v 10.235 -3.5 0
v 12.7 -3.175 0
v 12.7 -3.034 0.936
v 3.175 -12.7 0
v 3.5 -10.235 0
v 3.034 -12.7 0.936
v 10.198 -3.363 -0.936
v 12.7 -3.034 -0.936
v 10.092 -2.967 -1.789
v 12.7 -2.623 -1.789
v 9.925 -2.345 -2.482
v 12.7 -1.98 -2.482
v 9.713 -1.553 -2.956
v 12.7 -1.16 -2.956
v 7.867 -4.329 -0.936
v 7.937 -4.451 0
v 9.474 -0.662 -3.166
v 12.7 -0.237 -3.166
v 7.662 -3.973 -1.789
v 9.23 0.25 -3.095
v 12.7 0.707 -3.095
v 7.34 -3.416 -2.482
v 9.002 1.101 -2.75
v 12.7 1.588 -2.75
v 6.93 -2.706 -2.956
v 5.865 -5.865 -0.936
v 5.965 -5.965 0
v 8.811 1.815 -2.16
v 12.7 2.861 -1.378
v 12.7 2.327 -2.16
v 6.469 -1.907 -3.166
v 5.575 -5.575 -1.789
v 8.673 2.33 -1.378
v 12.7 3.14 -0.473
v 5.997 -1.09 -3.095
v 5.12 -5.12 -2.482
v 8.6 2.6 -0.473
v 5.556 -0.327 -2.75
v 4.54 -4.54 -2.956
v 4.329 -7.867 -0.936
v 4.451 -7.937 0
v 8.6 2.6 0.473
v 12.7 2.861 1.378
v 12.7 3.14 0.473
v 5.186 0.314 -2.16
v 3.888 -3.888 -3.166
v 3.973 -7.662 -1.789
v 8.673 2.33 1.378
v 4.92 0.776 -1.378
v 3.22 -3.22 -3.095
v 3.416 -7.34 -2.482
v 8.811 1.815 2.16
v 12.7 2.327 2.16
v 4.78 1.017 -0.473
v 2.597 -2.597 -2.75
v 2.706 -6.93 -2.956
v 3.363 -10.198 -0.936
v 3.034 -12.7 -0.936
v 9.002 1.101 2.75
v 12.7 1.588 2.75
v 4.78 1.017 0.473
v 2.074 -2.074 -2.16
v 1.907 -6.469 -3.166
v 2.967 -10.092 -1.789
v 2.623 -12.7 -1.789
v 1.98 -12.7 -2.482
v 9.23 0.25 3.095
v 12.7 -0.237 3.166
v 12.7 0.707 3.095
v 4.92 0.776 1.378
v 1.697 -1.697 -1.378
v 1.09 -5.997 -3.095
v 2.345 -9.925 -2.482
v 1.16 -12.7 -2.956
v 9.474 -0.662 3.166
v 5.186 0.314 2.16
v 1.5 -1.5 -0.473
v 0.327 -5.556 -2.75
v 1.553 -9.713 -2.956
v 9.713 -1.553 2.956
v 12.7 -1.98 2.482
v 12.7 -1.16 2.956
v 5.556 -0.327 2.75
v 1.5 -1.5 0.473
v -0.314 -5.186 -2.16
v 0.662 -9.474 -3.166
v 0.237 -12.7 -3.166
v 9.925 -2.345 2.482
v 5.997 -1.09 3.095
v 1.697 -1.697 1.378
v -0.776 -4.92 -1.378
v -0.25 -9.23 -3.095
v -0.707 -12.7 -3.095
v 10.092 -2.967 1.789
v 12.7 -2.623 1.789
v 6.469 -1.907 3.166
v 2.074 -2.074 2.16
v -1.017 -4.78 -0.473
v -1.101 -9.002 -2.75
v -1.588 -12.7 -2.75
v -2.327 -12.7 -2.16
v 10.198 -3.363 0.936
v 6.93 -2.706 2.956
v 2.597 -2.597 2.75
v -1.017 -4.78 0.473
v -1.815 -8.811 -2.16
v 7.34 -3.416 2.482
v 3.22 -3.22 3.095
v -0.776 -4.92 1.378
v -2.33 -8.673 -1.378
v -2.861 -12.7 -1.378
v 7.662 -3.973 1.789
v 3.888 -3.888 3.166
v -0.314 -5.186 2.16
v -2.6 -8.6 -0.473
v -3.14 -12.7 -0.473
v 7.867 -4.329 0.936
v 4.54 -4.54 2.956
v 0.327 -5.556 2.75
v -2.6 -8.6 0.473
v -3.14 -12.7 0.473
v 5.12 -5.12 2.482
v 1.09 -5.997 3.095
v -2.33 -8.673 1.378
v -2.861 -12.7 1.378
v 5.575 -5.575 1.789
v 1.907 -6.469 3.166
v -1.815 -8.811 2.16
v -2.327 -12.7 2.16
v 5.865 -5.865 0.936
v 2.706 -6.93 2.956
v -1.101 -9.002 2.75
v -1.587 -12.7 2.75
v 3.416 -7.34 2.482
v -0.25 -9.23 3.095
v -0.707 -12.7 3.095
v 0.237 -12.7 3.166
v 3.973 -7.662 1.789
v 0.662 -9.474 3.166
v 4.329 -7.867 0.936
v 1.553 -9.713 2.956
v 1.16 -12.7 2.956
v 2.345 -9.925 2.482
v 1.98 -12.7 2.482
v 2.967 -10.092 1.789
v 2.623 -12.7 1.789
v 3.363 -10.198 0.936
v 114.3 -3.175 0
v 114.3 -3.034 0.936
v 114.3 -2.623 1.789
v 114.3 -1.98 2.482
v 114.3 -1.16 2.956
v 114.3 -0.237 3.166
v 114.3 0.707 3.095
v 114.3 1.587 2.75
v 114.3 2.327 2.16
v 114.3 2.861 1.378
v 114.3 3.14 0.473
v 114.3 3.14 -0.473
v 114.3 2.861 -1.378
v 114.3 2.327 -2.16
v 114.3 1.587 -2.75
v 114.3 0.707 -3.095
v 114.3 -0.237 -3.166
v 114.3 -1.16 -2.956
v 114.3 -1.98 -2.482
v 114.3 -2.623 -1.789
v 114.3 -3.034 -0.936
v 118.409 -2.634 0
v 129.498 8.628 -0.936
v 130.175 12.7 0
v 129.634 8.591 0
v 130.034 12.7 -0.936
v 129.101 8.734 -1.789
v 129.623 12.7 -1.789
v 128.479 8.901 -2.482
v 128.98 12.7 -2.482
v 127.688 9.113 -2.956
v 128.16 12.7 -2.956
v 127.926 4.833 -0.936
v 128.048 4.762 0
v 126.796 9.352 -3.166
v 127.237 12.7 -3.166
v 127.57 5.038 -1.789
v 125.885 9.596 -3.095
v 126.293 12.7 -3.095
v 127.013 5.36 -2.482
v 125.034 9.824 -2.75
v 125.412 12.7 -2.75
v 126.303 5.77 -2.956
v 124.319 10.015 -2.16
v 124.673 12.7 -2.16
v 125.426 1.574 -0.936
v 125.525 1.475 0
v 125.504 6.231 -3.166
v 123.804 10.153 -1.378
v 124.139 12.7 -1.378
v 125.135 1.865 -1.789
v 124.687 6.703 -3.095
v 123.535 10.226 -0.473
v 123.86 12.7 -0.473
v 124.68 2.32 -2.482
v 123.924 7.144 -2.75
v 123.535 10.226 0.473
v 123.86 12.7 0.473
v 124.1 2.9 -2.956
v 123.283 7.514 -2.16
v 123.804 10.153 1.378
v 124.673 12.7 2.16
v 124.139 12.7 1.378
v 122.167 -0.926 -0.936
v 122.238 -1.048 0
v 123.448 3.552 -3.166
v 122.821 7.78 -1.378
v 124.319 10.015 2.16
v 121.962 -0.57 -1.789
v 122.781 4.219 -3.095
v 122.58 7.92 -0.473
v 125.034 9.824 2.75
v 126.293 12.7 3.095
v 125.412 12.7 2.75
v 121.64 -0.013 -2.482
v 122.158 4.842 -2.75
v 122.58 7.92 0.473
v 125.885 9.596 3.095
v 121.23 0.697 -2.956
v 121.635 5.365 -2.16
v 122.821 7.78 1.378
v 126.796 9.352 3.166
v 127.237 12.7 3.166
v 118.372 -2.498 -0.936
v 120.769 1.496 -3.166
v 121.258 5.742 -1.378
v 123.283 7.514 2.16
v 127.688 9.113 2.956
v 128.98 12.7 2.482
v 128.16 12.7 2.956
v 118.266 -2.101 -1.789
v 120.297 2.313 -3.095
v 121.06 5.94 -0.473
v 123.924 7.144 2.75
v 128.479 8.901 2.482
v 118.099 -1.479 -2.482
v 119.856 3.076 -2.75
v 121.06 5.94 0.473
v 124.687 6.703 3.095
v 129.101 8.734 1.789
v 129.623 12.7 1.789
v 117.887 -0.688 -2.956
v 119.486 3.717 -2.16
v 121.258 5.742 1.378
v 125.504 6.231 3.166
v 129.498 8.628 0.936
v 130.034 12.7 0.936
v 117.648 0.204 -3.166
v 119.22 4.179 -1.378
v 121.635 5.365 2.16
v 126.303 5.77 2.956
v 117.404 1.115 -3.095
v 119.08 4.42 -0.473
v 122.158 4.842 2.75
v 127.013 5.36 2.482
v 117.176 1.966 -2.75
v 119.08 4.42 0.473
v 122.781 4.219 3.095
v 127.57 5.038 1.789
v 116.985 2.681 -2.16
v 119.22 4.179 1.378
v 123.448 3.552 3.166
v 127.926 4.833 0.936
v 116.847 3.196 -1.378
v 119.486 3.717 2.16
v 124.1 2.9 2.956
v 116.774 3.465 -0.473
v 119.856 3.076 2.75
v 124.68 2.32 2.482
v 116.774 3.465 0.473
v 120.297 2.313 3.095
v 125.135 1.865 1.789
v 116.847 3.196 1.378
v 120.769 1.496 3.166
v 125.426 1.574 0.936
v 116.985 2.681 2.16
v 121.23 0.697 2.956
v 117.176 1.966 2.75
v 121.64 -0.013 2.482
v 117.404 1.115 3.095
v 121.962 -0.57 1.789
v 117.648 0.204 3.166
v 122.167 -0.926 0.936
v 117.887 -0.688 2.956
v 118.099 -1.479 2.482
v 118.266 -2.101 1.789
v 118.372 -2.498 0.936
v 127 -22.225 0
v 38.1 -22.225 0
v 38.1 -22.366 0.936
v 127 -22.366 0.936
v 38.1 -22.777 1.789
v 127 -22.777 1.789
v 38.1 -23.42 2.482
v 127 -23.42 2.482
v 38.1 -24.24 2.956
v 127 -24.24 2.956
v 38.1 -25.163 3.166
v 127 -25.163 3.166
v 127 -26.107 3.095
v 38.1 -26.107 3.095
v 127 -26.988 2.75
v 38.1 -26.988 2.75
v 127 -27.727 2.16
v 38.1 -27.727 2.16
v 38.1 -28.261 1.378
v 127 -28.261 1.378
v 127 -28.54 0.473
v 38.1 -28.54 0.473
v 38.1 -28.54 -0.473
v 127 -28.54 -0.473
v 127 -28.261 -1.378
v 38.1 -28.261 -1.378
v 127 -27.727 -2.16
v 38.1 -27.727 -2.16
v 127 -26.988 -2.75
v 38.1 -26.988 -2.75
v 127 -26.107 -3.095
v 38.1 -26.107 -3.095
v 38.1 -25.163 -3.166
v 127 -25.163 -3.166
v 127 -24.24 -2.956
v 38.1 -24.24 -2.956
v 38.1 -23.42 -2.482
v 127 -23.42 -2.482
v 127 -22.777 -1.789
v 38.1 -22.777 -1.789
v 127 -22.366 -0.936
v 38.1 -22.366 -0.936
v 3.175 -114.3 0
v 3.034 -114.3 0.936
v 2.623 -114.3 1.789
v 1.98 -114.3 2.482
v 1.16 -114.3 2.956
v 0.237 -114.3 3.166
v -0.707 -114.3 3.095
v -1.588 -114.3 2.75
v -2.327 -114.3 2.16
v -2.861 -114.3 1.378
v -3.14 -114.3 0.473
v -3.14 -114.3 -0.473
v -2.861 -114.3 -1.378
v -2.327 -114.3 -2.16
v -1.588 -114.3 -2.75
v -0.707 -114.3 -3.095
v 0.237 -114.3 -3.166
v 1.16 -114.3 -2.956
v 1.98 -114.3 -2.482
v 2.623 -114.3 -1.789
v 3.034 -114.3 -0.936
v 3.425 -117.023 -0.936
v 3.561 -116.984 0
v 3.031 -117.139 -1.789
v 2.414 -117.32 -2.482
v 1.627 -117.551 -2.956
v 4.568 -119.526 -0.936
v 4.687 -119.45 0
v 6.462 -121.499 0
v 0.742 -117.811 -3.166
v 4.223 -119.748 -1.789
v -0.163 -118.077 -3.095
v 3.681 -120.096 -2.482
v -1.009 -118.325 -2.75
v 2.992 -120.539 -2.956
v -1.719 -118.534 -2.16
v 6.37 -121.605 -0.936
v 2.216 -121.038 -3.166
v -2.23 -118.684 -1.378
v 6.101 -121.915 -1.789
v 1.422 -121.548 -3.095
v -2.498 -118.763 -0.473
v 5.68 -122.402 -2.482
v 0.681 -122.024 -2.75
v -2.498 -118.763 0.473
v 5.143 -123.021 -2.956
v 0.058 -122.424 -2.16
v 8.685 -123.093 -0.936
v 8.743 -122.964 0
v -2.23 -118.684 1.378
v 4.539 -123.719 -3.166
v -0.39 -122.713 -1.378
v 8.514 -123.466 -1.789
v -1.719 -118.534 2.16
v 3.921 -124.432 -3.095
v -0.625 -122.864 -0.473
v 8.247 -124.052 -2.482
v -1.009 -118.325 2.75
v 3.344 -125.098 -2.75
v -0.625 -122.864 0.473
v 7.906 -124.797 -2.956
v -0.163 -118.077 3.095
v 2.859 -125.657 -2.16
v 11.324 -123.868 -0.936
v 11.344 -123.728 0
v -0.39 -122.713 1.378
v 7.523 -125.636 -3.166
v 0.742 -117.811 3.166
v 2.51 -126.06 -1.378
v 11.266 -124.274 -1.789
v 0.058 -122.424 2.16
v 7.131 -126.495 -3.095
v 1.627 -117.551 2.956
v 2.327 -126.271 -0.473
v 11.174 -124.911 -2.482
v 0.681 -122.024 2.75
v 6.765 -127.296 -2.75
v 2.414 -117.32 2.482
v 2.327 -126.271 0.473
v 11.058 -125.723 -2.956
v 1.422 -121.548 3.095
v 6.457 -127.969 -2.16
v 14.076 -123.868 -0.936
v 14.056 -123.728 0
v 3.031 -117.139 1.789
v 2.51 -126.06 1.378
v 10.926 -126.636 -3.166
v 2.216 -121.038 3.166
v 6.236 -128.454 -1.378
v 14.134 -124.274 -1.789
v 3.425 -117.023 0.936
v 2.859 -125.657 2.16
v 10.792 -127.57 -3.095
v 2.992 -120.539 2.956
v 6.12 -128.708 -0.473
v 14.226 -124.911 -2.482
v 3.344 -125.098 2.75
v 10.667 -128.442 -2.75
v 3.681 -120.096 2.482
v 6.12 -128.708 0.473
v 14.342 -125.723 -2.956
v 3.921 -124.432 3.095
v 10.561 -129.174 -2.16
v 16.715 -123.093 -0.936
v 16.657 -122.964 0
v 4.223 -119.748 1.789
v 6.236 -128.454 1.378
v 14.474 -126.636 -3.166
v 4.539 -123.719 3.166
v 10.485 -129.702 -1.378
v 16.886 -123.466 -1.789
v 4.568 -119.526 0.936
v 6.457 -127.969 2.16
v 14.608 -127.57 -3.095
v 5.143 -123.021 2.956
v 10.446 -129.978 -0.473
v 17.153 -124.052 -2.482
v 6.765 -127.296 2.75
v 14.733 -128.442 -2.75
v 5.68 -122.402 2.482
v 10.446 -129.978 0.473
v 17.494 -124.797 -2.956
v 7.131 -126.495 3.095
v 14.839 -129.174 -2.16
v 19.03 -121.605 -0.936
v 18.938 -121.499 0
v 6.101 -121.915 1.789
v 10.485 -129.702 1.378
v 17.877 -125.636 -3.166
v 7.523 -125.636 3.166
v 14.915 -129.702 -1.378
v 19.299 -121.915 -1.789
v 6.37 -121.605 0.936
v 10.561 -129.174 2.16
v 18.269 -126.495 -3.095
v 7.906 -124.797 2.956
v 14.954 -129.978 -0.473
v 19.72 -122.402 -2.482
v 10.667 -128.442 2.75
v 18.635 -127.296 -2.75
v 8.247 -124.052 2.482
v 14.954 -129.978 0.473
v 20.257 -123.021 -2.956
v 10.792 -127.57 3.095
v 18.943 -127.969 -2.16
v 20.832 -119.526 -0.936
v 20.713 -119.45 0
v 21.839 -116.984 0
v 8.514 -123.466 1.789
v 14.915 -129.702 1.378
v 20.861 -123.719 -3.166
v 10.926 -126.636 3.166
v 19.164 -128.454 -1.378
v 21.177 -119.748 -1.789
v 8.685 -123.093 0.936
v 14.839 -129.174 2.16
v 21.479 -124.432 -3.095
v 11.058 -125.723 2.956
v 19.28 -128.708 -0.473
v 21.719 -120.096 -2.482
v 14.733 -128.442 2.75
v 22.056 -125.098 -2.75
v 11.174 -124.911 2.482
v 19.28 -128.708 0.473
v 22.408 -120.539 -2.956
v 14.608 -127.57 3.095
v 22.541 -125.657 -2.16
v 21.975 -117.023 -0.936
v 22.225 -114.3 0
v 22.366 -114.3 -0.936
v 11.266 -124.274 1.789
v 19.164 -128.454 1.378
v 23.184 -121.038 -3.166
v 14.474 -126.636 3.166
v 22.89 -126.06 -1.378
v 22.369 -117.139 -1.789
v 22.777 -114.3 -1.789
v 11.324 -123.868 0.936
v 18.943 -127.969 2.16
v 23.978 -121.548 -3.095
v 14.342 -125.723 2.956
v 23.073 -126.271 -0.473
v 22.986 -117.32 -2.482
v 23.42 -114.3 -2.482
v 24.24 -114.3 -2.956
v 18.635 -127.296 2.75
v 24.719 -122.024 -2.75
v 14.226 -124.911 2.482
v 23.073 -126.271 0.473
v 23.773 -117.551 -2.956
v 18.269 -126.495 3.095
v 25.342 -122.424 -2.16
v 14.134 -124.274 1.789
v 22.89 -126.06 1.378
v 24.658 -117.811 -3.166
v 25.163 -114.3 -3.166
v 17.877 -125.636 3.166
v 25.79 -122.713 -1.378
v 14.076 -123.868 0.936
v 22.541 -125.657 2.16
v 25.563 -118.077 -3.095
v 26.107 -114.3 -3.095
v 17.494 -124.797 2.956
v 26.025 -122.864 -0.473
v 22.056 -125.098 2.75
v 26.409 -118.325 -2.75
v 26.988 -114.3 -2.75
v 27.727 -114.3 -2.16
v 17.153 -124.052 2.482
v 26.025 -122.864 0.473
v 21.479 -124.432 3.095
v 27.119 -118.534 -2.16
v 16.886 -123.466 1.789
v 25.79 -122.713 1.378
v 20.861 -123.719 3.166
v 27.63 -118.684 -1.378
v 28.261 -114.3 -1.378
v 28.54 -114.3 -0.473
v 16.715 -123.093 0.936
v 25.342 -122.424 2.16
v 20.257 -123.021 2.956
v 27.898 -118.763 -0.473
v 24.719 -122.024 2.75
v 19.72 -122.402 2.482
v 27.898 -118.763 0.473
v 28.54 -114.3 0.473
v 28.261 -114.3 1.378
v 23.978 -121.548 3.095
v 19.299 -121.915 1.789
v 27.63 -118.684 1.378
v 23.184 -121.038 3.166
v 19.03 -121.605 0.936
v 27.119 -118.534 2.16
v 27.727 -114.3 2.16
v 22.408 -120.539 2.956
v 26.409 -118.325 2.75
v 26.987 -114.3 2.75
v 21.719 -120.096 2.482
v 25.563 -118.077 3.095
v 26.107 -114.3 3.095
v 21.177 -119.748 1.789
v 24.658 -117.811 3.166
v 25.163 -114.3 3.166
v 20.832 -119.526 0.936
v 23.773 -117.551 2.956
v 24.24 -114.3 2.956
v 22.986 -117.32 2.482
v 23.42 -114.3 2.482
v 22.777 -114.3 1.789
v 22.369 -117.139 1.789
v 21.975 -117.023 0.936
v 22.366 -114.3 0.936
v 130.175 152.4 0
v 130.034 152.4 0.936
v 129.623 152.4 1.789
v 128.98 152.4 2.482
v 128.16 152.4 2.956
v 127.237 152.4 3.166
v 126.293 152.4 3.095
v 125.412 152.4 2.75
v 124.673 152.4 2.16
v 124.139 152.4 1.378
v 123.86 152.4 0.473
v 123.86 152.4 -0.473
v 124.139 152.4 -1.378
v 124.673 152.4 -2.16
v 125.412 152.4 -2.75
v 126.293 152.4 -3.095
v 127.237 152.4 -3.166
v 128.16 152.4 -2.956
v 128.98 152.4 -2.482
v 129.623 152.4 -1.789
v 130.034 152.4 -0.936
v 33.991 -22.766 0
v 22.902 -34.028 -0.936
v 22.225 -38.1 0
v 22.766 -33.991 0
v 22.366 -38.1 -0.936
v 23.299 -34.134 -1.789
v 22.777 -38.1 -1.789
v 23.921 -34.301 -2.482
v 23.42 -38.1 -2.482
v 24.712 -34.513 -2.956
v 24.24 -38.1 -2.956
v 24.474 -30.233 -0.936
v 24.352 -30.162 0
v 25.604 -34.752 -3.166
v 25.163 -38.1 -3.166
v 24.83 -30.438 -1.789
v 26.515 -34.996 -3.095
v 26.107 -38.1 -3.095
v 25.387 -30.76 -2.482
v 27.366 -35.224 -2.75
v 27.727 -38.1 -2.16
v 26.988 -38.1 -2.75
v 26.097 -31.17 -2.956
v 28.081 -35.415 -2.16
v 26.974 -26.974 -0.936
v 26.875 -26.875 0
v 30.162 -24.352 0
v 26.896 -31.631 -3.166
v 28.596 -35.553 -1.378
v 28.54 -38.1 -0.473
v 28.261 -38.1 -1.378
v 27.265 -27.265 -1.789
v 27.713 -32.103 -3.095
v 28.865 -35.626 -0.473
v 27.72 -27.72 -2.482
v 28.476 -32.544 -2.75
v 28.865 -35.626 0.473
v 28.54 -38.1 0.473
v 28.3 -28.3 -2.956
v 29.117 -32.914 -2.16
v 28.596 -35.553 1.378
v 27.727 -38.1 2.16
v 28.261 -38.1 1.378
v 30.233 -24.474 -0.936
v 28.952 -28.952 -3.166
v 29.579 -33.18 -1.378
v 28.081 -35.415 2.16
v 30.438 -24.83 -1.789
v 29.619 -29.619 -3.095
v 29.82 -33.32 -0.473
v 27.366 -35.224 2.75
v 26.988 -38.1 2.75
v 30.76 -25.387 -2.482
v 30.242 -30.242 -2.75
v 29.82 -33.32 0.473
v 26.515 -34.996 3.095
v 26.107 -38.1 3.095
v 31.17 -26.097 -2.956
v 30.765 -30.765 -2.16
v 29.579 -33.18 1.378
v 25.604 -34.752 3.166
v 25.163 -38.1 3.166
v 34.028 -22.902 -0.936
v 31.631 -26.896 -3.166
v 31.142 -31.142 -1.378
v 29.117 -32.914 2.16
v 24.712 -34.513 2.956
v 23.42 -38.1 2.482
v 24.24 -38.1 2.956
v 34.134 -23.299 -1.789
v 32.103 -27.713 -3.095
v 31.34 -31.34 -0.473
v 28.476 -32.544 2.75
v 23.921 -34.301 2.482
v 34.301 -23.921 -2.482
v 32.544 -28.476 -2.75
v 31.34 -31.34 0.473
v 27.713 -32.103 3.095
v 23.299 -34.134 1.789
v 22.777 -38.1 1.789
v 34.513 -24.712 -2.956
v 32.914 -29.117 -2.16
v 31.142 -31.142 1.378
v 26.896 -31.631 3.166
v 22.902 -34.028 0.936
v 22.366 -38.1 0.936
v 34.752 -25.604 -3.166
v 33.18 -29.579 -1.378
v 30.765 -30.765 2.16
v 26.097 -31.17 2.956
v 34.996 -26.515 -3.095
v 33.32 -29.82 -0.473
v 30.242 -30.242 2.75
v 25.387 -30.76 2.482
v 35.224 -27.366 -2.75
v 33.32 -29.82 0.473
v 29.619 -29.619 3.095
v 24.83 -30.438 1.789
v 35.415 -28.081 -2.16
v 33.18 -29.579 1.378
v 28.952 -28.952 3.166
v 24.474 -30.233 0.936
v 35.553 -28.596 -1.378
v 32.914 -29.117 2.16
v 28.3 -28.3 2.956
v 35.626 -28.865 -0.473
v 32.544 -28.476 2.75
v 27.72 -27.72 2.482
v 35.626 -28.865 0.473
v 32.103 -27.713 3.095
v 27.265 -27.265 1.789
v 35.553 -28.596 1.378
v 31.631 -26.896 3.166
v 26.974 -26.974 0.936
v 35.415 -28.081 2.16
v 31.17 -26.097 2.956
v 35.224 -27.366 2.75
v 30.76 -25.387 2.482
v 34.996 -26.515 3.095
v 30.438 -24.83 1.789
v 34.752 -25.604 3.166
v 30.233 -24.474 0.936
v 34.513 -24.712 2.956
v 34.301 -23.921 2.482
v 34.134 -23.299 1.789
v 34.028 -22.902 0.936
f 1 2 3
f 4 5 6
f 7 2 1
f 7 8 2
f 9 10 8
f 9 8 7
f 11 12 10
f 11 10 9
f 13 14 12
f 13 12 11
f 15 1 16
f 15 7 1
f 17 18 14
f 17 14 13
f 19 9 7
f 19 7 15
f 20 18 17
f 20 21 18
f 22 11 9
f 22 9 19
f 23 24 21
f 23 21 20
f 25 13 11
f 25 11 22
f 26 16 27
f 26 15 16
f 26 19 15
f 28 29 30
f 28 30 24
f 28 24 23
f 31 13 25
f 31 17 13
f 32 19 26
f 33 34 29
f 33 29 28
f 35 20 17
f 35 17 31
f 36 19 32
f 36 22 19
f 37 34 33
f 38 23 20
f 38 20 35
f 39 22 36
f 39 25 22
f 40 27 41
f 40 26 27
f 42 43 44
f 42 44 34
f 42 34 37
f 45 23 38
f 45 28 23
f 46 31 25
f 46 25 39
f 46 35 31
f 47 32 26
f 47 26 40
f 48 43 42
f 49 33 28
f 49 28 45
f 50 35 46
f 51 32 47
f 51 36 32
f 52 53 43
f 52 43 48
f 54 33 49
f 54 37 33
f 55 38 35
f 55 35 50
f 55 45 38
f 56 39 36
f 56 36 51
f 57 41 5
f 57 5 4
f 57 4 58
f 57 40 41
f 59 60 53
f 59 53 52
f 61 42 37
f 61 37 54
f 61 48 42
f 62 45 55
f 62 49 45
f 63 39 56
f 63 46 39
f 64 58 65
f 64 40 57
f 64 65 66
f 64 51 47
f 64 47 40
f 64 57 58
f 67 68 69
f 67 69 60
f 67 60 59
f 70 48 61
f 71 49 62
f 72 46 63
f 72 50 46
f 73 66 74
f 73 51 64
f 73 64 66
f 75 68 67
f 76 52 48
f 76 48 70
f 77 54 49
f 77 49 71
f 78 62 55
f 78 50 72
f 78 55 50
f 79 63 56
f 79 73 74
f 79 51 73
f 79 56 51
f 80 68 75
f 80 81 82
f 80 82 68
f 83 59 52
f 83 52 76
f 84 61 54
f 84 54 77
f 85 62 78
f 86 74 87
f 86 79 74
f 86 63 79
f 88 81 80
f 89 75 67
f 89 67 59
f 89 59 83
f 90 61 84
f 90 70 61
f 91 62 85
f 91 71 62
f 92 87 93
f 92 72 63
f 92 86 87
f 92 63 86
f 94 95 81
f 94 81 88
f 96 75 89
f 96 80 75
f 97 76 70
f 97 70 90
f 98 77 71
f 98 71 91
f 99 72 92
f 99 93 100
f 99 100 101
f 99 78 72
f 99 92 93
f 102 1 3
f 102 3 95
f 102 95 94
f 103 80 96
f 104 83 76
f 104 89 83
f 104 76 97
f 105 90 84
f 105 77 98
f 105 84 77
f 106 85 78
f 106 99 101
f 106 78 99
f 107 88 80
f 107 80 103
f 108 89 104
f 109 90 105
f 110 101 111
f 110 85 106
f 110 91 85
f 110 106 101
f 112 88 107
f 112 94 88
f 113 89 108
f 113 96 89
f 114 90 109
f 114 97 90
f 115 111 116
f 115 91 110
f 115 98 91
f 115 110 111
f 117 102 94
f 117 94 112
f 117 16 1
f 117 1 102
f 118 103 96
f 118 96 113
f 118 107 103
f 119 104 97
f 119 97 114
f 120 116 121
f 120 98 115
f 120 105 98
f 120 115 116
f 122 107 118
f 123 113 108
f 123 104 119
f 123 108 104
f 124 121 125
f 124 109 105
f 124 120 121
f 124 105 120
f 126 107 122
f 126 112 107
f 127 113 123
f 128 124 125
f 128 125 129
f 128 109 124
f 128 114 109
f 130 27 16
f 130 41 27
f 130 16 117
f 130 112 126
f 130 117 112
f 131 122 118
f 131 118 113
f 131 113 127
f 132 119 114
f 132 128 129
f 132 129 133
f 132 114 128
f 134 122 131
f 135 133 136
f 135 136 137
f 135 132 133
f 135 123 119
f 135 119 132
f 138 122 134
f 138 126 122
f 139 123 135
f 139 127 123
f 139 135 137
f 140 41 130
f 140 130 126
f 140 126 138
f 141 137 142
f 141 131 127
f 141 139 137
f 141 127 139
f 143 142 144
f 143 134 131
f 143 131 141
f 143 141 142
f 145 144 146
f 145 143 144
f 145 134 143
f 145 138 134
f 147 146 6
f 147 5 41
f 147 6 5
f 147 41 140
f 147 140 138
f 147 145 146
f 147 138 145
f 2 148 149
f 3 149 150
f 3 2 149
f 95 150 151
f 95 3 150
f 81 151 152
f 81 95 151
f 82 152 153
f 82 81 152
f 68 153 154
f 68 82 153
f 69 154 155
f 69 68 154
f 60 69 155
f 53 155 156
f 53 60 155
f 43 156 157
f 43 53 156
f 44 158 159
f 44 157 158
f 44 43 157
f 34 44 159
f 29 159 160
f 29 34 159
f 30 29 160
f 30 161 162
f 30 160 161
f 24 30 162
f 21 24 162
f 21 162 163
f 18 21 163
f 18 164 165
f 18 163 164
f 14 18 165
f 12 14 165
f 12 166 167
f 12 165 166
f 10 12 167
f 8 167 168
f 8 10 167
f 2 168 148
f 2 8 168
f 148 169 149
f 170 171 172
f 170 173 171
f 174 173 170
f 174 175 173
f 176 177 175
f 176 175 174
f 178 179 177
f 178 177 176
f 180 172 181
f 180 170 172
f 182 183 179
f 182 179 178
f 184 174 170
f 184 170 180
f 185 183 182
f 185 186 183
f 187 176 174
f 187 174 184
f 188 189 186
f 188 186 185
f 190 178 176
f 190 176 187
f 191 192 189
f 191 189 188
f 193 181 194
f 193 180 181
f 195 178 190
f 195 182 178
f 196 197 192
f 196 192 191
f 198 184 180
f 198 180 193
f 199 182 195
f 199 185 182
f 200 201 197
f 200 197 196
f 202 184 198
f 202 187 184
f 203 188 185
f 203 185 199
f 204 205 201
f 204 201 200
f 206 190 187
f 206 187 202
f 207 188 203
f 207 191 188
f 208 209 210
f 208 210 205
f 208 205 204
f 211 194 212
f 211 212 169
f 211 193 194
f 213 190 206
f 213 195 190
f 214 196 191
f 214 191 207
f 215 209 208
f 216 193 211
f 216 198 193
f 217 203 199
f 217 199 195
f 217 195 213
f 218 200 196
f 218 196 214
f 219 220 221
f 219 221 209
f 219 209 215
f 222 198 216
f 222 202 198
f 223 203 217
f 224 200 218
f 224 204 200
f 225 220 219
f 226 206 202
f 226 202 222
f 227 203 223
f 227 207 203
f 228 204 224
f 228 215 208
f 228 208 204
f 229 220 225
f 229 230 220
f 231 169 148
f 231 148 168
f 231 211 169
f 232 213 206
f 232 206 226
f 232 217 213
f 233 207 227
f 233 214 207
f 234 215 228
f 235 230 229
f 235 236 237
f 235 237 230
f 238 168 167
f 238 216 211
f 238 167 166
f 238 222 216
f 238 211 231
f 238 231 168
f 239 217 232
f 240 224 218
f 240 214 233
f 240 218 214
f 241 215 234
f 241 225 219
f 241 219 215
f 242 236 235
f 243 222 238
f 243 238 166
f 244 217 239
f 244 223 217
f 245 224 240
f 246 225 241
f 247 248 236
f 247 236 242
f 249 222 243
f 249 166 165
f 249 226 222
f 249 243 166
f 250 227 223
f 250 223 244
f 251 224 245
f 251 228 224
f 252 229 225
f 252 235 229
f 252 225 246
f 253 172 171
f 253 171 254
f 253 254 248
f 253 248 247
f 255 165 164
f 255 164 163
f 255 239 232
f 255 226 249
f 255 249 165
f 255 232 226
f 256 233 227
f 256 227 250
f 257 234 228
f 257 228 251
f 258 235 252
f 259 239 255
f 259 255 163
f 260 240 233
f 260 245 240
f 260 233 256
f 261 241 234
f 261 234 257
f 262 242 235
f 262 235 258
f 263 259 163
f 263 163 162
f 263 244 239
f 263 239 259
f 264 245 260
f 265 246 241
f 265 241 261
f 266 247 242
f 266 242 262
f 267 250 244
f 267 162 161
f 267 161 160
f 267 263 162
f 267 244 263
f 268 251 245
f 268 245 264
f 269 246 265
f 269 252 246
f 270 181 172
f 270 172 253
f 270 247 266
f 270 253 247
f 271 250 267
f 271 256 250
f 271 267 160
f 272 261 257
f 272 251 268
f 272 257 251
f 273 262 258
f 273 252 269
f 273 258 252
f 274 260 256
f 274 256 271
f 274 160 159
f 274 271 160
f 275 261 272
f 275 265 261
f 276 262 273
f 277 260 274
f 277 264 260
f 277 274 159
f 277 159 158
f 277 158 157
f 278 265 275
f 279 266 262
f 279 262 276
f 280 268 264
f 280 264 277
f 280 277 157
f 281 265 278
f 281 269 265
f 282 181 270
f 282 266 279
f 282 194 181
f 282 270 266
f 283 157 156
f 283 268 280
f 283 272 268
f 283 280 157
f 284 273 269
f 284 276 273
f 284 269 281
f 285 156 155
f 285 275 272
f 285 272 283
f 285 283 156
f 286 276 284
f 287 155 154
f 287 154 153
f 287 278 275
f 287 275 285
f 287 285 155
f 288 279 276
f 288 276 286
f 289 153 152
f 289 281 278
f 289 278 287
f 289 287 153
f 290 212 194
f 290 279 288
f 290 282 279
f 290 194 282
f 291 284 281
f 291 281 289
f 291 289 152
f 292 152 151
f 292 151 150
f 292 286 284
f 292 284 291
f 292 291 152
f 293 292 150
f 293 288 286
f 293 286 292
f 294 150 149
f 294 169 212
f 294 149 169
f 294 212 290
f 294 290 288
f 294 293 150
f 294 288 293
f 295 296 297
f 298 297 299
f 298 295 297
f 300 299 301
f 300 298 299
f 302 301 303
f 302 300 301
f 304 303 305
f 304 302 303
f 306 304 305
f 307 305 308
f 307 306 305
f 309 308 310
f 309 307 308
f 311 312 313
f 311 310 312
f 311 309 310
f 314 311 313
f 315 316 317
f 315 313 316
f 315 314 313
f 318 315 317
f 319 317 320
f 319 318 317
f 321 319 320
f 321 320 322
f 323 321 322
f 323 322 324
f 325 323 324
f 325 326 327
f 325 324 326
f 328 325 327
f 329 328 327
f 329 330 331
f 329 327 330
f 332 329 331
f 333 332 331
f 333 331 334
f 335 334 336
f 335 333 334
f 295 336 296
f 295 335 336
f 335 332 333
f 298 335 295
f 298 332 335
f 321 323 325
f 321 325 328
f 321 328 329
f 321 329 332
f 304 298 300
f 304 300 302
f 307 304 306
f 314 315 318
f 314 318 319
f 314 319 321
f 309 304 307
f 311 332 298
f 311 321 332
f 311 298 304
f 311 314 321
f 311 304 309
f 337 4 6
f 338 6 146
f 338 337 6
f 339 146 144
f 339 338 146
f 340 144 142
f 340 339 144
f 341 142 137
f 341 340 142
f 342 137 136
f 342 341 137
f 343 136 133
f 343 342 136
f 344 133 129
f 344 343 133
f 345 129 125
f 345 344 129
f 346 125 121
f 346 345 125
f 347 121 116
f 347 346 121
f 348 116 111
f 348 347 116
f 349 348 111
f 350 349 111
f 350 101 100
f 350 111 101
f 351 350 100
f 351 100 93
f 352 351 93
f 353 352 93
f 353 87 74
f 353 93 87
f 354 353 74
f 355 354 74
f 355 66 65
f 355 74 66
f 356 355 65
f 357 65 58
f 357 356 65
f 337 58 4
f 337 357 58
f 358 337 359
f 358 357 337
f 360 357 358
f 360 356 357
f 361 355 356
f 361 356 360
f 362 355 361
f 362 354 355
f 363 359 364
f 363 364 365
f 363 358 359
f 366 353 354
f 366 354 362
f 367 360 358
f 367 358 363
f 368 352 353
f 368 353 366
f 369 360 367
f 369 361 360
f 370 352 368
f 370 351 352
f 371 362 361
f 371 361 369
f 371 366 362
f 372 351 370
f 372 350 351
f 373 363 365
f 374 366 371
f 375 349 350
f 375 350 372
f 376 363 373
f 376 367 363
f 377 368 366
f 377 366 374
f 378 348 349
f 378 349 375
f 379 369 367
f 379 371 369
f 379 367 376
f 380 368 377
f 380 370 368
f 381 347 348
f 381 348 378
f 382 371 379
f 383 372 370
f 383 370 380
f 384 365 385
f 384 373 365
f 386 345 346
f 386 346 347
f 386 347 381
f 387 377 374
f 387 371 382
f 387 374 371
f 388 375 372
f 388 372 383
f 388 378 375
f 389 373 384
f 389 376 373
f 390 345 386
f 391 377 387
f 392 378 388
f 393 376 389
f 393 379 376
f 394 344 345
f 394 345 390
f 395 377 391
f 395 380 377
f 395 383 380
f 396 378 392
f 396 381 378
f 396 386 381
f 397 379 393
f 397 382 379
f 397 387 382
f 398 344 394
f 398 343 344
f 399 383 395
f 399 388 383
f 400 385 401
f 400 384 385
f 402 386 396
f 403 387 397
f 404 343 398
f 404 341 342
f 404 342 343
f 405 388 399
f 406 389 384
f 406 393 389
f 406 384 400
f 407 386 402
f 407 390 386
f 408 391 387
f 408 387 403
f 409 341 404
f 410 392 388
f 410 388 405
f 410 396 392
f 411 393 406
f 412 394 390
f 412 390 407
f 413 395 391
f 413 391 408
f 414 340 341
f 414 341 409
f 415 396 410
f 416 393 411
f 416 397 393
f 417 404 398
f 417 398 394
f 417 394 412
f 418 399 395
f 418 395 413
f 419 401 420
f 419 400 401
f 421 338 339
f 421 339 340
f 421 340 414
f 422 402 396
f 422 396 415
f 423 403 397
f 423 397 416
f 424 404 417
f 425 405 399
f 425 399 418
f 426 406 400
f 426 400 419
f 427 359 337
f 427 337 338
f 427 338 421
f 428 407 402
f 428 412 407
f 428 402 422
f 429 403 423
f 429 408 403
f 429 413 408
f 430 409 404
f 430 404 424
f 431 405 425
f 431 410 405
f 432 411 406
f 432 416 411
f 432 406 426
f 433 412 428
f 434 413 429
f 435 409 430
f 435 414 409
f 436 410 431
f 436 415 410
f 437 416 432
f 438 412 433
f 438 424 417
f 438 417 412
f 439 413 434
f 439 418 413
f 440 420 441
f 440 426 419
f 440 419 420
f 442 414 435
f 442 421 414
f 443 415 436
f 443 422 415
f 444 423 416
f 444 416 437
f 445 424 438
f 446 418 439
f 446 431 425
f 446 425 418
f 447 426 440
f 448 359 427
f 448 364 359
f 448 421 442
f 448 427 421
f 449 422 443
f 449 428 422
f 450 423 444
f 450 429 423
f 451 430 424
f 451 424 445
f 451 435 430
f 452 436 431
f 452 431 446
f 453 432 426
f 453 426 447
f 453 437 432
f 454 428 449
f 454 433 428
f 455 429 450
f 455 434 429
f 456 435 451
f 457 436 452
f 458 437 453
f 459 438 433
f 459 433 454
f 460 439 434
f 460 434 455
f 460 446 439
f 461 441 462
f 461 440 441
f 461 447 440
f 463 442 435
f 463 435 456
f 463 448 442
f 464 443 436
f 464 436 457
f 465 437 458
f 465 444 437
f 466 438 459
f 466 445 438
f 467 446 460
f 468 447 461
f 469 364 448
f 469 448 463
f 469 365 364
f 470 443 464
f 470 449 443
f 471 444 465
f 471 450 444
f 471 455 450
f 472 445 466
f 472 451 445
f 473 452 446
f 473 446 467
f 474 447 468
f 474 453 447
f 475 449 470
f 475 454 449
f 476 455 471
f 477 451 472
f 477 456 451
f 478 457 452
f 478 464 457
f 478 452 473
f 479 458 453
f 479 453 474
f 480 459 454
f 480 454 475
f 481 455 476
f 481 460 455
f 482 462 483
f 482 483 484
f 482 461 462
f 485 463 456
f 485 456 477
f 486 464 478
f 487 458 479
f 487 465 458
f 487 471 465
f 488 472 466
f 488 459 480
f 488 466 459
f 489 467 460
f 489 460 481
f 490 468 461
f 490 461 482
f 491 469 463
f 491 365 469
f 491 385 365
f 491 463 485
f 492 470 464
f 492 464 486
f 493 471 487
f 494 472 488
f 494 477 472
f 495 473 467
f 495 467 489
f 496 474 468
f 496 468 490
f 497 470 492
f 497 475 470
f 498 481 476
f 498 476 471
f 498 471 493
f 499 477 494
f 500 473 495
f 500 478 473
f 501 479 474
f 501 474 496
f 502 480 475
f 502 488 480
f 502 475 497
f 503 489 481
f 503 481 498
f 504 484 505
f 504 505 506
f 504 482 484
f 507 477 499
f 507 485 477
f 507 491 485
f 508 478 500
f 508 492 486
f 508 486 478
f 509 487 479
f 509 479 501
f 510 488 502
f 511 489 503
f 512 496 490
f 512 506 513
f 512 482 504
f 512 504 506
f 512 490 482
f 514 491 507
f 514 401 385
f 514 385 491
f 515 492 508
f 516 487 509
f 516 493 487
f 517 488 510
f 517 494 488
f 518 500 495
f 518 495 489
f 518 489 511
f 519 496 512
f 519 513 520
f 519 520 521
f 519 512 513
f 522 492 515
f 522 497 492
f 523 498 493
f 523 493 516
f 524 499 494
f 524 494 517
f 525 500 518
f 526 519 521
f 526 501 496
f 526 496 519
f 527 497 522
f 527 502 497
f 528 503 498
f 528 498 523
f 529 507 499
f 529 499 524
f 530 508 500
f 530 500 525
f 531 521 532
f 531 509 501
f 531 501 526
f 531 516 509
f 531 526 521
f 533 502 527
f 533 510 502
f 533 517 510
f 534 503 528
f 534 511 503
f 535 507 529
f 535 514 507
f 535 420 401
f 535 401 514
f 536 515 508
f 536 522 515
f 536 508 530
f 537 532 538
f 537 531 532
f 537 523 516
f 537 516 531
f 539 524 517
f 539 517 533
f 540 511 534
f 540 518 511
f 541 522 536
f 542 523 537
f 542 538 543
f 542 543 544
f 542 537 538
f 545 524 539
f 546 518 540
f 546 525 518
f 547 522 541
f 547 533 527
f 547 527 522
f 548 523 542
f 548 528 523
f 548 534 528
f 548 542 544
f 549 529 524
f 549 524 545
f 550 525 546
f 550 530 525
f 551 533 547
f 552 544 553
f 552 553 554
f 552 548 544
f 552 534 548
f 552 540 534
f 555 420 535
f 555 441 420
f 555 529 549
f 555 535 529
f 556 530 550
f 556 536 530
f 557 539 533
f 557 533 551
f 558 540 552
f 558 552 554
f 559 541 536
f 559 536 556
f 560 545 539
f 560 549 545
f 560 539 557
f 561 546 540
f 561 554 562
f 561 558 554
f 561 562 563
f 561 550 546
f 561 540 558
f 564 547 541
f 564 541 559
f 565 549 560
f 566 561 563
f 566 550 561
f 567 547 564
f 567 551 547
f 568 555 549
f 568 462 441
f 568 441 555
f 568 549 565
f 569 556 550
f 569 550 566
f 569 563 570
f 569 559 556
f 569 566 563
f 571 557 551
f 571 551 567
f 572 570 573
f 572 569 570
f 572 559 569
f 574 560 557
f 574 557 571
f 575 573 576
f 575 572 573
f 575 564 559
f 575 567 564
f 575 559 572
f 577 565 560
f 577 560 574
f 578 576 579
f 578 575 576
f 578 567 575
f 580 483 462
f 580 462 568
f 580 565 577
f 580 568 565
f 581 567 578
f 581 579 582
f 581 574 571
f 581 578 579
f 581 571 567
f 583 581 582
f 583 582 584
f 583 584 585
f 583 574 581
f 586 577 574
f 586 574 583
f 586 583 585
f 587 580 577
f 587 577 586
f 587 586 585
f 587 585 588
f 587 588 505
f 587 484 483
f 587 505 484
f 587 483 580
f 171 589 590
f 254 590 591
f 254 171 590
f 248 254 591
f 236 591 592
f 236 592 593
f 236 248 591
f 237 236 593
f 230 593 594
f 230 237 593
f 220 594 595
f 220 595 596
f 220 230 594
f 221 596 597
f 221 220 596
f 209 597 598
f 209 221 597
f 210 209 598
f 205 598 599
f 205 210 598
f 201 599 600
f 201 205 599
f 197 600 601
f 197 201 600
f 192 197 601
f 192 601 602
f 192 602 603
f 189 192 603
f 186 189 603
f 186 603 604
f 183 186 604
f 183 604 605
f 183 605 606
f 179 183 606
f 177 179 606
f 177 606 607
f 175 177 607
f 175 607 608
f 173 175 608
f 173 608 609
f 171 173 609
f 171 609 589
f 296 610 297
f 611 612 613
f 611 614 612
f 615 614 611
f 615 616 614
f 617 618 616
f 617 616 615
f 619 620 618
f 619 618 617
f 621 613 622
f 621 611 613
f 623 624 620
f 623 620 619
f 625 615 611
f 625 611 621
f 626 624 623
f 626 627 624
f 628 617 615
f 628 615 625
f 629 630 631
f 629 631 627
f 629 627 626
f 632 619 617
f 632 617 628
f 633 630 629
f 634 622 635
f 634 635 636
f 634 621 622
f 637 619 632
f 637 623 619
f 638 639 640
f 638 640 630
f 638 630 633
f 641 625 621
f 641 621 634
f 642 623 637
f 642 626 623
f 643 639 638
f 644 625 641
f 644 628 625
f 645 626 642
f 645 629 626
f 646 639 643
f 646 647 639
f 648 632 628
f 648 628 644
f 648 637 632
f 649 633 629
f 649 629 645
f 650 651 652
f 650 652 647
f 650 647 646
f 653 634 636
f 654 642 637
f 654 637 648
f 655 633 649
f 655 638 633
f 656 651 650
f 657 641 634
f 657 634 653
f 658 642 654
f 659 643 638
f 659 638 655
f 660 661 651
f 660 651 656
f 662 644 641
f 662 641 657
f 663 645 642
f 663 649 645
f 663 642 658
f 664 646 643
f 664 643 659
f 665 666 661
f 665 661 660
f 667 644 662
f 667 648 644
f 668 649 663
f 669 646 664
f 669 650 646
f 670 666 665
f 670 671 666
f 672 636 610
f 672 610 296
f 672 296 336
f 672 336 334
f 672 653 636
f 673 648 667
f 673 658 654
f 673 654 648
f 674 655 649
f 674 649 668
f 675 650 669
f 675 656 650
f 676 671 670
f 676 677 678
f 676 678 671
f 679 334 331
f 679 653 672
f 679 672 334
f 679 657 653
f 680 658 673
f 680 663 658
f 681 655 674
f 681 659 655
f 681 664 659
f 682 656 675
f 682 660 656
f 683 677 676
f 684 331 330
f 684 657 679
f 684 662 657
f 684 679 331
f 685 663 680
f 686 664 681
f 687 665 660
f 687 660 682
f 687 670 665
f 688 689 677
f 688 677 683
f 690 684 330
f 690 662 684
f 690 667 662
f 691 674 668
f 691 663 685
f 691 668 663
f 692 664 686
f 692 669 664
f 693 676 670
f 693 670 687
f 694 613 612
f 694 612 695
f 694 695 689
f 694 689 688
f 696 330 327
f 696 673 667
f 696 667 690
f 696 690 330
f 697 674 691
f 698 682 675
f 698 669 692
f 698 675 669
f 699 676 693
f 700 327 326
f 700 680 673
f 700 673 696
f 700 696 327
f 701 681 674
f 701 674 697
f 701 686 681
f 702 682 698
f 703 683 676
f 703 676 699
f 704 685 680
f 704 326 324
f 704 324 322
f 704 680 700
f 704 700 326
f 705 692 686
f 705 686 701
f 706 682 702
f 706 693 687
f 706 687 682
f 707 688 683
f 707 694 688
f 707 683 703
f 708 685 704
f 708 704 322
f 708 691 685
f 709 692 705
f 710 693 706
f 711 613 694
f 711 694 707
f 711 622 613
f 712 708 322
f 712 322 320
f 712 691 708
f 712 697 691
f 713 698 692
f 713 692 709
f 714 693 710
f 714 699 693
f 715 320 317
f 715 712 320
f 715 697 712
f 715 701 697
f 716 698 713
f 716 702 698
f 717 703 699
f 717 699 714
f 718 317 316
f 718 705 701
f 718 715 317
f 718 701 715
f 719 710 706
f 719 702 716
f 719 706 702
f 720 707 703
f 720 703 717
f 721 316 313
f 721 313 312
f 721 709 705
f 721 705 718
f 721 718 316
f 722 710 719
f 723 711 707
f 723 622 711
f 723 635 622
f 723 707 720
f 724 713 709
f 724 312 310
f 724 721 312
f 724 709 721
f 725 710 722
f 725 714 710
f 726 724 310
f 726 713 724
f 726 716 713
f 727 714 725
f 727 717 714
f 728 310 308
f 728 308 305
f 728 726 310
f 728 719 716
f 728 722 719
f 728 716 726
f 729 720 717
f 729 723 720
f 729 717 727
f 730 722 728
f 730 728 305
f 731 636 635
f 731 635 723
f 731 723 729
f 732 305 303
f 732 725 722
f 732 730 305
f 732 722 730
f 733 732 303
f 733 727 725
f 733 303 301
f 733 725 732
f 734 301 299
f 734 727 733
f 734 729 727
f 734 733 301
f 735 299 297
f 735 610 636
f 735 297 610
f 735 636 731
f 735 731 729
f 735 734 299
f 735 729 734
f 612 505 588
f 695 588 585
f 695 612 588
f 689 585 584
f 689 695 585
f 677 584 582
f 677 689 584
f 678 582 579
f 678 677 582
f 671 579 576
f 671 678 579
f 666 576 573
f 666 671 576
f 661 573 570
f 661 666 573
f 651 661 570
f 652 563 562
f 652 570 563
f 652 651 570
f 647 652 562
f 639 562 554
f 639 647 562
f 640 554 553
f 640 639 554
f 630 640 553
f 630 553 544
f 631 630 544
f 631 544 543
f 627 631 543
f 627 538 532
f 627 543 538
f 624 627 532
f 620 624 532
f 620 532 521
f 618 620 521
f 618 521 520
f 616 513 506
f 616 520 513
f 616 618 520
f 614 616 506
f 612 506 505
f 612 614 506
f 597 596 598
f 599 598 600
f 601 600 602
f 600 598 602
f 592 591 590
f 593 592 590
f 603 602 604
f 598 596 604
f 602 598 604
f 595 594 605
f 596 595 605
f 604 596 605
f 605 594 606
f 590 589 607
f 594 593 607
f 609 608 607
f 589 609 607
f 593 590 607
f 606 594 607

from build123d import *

# Parameters (mm, degrees)
F2_R = 3.175


with BuildPart() as f3:
    # F3: sweep along a path in F0
    with BuildLine(Plane.XY) as f3_path:
        Line((127, 152.4), (127, 12.7))
        ThreePointArc((127, 12.7), (123.2802561211, 3.7197438789), (114.3, 0))
        Line((114.3, 0), (12.7, 0))
        ThreePointArc((12.7, 0), (3.7197438789, -3.7197438789), (0, -12.7))
        Line((0, -12.7), (0, -114.3))
        ThreePointArc((0, -114.3), (12.7, -127), (25.4, -114.3))
        Line((25.4, -114.3), (25.4, -38.1))
        ThreePointArc((25.4, -38.1), (29.1197438789, -29.1197438789), (38.1, -25.4))
        Line((38.1, -25.4), (127, -25.4))
    # F2 (on offset) → F3 (sweep)
    with BuildSketch(Plane.XZ.offset(-152.4)):
        with Locations((127, 0)):
            Circle(F2_R)
    sweep(path=f3_path.line)


solid = f3.part
